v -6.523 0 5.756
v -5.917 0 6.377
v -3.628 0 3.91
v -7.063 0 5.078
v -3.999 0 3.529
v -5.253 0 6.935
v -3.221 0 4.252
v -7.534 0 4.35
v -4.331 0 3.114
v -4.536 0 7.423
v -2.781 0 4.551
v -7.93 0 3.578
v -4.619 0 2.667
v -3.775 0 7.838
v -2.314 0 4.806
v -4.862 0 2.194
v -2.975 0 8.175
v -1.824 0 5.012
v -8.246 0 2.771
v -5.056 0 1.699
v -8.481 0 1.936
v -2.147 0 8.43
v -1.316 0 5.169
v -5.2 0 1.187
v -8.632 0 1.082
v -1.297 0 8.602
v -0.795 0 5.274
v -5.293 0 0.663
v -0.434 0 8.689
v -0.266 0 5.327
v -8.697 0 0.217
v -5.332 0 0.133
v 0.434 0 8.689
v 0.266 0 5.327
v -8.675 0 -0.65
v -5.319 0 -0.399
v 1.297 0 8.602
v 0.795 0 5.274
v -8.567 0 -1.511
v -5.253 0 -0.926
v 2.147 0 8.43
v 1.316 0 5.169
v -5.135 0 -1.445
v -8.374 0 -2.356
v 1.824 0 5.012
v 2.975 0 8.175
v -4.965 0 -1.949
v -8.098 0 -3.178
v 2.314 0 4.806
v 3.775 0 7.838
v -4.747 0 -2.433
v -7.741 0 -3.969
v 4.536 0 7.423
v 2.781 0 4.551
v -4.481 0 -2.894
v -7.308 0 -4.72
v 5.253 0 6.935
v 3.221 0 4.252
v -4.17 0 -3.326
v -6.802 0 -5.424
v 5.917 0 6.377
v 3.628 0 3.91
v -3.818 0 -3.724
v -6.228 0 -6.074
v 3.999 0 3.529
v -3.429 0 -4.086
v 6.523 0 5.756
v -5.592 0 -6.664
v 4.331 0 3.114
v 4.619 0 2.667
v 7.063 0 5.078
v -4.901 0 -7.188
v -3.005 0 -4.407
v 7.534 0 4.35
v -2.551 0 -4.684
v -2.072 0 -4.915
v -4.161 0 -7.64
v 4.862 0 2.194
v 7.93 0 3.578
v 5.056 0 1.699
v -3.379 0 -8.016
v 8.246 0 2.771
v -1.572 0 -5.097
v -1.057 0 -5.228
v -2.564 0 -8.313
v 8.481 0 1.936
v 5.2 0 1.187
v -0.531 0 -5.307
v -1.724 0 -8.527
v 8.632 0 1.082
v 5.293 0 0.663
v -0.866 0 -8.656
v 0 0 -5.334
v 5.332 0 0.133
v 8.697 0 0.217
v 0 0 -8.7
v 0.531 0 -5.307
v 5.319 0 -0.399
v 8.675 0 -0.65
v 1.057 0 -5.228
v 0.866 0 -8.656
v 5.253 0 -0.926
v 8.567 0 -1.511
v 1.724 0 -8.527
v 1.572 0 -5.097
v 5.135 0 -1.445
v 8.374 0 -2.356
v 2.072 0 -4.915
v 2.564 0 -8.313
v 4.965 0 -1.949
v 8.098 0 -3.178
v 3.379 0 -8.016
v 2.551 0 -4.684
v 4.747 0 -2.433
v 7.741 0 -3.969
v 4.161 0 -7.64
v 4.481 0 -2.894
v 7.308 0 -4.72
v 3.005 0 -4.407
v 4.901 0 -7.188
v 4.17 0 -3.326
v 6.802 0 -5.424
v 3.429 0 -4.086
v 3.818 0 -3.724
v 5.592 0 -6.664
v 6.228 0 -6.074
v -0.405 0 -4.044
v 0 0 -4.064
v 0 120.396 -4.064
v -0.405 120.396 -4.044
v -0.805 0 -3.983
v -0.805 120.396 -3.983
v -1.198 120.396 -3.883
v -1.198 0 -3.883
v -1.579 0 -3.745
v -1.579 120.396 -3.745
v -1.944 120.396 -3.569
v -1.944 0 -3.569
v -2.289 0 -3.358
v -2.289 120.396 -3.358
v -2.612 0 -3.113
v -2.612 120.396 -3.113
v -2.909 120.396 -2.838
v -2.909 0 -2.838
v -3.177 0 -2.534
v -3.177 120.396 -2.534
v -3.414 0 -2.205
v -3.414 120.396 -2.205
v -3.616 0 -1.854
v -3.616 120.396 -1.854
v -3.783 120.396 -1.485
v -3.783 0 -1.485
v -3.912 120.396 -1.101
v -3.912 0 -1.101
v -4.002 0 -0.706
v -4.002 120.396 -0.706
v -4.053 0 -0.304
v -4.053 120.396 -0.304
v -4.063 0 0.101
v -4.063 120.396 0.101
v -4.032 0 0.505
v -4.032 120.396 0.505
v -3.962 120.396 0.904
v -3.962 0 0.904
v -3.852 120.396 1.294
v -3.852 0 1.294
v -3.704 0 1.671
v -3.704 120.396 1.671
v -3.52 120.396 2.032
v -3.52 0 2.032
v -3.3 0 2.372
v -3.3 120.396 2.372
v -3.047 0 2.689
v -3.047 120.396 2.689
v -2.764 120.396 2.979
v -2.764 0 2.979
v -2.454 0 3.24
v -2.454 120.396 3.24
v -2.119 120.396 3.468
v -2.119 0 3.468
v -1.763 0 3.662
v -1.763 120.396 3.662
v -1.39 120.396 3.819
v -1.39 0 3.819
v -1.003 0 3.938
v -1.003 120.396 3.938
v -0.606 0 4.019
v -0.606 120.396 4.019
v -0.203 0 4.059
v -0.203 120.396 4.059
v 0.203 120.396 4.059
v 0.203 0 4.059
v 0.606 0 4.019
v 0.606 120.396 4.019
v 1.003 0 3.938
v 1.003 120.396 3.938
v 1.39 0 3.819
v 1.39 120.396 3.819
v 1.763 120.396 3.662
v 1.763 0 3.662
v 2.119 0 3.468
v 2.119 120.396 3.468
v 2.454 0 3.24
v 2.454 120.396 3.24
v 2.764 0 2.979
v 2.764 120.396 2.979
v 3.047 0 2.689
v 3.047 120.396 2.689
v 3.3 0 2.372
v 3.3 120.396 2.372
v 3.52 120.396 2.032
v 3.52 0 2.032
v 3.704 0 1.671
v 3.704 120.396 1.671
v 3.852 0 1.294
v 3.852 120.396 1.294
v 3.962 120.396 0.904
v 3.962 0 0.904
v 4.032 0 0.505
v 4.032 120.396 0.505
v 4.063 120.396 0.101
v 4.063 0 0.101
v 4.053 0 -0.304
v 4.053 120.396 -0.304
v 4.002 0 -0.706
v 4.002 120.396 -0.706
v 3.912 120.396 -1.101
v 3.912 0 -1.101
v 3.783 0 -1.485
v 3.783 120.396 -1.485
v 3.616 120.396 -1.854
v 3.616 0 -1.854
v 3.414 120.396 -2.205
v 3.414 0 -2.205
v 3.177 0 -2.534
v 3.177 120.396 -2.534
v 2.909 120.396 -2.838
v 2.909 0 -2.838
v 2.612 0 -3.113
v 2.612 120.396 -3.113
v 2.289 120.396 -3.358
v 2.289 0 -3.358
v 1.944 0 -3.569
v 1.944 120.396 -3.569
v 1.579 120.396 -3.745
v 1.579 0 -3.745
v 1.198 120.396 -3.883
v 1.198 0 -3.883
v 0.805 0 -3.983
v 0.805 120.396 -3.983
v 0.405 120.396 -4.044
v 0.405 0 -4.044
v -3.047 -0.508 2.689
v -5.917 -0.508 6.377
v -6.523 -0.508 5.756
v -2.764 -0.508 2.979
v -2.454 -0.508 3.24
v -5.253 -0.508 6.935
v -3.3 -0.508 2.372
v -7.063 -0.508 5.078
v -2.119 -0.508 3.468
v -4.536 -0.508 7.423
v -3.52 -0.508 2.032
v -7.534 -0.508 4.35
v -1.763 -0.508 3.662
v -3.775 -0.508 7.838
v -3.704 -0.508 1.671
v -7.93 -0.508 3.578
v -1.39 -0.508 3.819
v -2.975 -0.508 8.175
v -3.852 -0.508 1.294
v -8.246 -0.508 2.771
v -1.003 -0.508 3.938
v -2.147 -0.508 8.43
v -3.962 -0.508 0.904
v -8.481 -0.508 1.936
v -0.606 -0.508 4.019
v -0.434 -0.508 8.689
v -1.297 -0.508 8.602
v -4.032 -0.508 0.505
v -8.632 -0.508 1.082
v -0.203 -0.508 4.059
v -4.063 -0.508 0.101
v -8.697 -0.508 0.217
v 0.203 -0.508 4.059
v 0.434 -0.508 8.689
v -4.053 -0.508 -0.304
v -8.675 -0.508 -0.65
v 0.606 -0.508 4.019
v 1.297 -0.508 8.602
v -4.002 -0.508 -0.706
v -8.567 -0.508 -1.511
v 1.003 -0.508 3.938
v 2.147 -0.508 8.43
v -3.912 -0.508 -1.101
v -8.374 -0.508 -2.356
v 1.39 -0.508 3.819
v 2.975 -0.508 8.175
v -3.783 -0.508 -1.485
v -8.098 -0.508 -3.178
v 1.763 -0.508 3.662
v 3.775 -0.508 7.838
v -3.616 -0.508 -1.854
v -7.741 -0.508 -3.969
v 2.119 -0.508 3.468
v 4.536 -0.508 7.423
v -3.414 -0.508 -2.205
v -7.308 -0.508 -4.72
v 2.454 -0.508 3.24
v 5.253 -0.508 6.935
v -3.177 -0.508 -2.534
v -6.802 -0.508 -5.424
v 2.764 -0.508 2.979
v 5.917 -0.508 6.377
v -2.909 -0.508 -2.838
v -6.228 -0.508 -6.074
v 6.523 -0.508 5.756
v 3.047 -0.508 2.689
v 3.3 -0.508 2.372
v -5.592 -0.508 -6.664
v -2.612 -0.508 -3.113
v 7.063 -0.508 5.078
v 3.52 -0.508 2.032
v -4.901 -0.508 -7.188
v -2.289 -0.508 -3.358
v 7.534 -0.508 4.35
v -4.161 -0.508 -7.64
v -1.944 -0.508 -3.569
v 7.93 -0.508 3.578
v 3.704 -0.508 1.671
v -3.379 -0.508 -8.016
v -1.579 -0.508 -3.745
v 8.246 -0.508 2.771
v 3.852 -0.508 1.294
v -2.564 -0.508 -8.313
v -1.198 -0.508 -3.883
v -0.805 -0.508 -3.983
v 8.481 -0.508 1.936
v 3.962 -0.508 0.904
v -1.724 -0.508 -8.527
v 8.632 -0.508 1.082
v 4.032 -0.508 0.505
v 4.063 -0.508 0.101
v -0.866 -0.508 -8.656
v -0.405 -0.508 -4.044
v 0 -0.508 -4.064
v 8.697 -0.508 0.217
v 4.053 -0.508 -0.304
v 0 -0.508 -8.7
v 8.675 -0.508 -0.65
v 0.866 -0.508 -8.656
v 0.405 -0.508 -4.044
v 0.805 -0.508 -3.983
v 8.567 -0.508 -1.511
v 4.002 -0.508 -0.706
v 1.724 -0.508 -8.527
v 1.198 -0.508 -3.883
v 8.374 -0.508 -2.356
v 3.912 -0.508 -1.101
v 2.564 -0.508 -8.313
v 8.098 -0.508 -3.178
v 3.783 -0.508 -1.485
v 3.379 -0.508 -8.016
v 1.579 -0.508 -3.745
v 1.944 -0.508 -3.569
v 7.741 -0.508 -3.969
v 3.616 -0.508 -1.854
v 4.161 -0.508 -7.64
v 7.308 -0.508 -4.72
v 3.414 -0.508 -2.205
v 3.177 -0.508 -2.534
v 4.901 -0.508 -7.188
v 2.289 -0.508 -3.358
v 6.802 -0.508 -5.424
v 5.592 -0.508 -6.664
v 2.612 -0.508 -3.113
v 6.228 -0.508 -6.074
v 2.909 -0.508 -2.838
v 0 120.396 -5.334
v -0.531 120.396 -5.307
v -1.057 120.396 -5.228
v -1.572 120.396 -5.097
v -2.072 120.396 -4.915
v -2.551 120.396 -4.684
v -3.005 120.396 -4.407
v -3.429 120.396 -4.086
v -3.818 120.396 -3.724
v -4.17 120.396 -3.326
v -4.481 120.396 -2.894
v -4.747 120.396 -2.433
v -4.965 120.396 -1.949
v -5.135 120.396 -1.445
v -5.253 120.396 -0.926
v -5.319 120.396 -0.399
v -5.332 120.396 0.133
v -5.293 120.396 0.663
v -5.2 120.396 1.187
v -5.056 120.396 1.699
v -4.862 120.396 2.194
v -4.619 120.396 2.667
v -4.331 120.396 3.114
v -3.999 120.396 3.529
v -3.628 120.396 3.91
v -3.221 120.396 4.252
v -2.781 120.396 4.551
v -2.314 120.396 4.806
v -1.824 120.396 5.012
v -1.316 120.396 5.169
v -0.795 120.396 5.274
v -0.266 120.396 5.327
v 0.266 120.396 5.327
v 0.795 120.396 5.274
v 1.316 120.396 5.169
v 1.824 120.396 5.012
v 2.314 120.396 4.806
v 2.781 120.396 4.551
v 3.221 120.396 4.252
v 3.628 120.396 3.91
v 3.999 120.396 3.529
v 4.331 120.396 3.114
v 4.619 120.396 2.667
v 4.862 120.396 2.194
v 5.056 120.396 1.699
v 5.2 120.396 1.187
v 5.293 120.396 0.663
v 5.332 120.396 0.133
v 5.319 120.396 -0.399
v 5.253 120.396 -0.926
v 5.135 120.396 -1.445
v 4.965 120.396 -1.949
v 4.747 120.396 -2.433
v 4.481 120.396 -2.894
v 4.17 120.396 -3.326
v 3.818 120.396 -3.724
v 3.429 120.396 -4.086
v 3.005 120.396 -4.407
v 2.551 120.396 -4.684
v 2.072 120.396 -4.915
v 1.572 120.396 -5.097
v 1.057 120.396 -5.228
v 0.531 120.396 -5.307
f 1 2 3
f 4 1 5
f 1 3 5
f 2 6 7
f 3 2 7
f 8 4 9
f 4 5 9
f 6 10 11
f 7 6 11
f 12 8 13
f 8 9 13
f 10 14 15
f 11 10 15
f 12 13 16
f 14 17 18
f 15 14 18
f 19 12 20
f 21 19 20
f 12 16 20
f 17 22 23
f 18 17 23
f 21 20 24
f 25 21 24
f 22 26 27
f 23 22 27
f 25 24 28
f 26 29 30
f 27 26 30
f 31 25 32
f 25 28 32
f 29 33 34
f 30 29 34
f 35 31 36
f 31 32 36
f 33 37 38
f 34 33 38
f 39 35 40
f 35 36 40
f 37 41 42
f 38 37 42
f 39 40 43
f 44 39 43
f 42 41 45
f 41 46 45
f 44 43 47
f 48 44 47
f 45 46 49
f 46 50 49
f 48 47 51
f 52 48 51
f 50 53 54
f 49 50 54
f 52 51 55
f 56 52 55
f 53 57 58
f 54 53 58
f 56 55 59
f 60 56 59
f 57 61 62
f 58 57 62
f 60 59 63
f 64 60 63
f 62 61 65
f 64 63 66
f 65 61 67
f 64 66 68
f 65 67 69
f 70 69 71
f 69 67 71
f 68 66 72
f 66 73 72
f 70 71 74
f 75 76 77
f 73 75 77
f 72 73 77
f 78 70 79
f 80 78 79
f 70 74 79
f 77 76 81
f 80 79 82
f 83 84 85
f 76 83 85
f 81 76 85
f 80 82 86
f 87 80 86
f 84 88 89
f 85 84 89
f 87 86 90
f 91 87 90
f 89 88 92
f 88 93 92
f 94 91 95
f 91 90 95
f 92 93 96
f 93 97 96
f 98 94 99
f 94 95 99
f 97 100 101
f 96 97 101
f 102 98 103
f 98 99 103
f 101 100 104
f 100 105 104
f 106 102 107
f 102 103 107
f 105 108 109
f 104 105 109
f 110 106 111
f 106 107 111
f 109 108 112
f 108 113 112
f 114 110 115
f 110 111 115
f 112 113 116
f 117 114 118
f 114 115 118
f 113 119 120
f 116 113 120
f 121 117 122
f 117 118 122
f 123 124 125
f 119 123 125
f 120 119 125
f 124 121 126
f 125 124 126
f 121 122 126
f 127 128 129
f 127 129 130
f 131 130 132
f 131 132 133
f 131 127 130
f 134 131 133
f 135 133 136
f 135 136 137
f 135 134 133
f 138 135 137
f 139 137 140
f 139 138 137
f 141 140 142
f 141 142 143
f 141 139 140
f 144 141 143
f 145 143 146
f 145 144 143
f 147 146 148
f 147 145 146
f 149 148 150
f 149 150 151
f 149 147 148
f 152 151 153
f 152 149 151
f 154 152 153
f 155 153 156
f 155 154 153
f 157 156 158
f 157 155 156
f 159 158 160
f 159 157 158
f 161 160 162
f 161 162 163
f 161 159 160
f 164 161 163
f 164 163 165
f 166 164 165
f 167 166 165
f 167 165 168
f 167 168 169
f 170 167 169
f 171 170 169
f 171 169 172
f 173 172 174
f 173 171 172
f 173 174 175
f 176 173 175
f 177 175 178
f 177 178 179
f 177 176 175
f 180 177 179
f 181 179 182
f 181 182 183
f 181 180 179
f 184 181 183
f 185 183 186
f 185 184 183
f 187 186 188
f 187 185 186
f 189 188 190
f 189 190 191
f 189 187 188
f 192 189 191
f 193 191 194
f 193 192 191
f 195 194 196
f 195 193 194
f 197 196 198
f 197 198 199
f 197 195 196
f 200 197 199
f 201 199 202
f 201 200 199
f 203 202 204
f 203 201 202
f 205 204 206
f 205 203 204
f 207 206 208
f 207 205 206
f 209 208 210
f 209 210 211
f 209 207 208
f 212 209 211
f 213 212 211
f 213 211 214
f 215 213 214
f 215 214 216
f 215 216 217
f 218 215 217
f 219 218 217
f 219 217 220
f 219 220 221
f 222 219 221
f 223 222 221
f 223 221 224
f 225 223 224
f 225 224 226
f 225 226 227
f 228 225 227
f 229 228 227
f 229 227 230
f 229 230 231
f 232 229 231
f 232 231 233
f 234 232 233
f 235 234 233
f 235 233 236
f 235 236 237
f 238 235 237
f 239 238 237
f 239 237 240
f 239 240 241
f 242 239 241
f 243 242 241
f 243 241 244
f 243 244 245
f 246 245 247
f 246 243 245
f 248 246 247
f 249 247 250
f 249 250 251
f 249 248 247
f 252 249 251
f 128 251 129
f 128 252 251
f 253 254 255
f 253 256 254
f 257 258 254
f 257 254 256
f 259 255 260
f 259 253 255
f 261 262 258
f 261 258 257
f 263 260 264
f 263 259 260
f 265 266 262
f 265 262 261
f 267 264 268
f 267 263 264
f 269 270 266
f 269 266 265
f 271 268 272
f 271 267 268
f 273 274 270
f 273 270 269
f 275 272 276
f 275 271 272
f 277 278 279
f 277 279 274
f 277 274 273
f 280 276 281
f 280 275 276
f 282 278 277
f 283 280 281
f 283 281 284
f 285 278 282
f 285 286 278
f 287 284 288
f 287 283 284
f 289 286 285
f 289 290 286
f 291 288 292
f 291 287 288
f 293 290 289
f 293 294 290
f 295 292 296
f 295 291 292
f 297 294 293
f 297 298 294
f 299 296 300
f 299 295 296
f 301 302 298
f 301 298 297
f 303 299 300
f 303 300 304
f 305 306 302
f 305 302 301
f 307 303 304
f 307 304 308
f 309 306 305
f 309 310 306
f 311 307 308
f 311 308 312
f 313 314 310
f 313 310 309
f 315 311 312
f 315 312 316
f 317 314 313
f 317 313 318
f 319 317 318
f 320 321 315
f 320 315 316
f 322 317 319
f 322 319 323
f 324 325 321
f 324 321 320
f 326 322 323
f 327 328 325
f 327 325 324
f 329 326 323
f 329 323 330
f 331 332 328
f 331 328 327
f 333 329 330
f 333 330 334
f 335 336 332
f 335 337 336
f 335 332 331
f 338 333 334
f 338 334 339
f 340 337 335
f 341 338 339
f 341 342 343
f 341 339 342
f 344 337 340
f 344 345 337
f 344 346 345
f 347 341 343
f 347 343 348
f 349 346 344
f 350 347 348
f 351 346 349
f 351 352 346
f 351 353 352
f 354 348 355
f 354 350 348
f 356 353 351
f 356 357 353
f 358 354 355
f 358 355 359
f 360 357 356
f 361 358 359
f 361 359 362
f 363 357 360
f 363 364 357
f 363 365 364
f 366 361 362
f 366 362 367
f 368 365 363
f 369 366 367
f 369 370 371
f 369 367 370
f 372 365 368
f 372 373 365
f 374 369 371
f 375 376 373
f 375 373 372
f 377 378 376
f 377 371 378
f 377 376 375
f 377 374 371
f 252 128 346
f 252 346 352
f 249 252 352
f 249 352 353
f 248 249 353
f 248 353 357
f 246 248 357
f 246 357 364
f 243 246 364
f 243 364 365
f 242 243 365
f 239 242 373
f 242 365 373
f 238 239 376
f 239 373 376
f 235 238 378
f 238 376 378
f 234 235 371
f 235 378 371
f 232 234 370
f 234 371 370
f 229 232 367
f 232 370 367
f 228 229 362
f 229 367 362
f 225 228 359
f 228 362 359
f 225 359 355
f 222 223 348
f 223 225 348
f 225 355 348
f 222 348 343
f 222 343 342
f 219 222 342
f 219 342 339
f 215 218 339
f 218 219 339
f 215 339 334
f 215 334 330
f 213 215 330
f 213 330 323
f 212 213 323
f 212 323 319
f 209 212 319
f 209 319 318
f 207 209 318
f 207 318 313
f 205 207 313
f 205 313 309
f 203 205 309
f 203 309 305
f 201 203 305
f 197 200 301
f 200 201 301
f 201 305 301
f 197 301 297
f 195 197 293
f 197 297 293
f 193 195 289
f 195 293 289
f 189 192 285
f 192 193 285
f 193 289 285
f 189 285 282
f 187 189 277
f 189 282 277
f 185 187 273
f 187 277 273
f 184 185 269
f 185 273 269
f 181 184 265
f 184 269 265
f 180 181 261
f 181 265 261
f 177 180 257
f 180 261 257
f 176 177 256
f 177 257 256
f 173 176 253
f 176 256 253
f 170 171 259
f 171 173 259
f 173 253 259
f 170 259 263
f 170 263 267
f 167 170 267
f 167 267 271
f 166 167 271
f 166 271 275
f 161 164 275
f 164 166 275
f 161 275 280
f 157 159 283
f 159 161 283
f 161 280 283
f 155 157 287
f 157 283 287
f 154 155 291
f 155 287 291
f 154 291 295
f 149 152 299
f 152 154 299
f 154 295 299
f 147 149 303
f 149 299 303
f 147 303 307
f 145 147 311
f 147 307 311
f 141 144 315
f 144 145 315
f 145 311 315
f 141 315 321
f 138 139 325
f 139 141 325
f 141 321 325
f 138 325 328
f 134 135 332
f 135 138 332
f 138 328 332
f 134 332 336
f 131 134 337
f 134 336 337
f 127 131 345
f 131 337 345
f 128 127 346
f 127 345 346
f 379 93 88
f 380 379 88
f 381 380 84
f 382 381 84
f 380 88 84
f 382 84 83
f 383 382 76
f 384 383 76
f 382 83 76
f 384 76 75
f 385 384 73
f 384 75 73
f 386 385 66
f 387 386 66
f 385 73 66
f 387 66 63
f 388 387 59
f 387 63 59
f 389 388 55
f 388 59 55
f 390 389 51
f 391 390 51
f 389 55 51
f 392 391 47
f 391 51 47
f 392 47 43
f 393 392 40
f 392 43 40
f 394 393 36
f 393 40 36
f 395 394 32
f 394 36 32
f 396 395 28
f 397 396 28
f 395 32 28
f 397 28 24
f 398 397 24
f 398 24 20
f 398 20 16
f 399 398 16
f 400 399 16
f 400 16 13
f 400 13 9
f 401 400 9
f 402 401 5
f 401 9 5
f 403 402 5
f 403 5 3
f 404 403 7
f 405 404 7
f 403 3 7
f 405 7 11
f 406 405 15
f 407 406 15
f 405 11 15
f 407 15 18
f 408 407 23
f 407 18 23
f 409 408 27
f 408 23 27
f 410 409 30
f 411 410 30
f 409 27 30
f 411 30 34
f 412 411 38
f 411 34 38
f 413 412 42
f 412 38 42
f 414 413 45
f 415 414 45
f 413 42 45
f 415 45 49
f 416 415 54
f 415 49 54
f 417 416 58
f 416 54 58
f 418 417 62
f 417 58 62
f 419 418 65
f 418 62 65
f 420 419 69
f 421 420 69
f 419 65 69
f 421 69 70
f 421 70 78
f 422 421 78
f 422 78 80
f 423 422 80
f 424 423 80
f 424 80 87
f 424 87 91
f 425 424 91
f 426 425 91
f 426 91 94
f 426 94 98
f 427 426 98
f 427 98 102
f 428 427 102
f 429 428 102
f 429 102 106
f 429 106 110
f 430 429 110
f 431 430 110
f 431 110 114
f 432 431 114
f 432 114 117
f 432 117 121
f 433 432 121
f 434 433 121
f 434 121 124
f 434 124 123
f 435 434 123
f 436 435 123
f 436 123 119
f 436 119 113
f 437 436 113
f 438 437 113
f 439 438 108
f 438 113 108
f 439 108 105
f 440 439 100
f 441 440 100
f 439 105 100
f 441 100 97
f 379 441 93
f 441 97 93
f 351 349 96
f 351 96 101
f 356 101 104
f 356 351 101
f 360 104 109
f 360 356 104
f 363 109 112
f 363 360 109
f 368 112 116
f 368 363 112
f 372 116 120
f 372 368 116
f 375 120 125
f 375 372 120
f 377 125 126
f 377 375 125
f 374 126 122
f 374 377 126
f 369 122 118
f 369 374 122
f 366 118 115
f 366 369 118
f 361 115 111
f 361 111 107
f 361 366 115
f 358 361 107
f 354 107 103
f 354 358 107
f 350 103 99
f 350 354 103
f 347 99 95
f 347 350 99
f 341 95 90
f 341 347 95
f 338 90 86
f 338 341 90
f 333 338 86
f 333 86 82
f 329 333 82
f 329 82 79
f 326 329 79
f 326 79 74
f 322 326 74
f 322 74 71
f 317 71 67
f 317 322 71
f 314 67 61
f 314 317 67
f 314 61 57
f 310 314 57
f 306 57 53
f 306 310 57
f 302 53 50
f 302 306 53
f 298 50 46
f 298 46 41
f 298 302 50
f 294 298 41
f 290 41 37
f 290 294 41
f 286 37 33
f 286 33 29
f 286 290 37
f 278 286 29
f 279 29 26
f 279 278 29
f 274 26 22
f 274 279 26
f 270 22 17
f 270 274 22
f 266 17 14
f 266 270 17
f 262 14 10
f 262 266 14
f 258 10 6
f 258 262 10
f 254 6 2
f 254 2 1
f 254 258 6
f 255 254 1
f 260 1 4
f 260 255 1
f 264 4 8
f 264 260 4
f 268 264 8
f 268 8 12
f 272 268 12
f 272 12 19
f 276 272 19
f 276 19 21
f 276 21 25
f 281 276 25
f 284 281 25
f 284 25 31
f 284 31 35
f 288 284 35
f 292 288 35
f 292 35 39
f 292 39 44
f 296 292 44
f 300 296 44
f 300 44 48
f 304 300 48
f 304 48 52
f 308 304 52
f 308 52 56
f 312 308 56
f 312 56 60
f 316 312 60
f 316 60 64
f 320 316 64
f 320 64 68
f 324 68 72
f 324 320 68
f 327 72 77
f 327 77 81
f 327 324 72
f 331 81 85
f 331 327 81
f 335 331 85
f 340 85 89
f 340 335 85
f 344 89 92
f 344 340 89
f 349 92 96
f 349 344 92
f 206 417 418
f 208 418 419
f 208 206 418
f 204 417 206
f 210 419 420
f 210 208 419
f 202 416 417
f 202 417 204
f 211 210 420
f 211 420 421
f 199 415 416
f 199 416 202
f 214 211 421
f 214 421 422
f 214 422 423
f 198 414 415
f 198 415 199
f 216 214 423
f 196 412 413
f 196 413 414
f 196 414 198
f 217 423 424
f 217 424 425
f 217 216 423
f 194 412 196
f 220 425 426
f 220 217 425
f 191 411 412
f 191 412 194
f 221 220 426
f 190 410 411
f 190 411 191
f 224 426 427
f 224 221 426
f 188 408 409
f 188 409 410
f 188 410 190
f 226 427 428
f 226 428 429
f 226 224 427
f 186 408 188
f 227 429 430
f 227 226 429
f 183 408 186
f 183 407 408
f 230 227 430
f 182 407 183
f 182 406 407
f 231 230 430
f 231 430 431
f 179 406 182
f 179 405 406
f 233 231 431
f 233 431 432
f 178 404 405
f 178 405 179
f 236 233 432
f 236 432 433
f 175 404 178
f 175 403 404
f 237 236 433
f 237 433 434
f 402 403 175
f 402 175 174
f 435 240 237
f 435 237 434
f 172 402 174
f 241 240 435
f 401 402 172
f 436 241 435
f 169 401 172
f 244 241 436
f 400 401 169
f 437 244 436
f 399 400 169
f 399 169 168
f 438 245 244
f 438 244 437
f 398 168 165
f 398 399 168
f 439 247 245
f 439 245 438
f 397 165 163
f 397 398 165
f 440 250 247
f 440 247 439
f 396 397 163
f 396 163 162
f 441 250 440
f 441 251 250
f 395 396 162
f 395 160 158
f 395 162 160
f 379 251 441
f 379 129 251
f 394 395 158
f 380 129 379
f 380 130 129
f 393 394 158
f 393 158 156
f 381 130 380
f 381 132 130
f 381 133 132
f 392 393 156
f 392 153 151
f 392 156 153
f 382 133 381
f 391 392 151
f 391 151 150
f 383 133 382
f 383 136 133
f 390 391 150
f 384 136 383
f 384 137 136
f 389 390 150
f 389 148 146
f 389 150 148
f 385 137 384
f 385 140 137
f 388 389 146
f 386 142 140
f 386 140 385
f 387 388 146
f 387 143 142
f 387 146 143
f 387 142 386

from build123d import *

# Parameters (mm, degrees)
SKETCH1_R           = 5.334
SKETCH1_R_2         = 4.064
BOSS_EXTRUDE1_DEPTH = 120.396
BOSS_EXTRUDE2_START = 0.508
SKETCH2_R           = 8.6995
SKETCH2_R_2         = 4.064
BOSS_EXTRUDE2_DEPTH = 0.508


with BuildPart() as part:
    # Sketch1 → Boss-Extrude1 (new body)
    with BuildSketch(Plane(origin=(0, 0, 0), x_dir=(1, 0, 0), z_dir=(0, 1, 0))):
        with Locations(Location((0, 0, 0), (0, 0, 90))):
            Circle(SKETCH1_R)
        with Locations(Location((0, 0, 0), (0, 0, 90))):
            Circle(SKETCH1_R_2, mode=Mode.SUBTRACT)
    extrude(amount=BOSS_EXTRUDE1_DEPTH)

    # Sketch2 → Boss-Extrude2 (add)
    with BuildSketch(Plane.XZ.offset(BOSS_EXTRUDE2_START)):
        with Locations(Location((0, 0, 0), (0, 0, 270))):
            Circle(SKETCH2_R)
        with Locations(Location((0, 0, 0), (0, 0, 270))):
            Circle(SKETCH2_R_2, mode=Mode.SUBTRACT)
    extrude(amount=-BOSS_EXTRUDE2_DEPTH)


solid = part.part
